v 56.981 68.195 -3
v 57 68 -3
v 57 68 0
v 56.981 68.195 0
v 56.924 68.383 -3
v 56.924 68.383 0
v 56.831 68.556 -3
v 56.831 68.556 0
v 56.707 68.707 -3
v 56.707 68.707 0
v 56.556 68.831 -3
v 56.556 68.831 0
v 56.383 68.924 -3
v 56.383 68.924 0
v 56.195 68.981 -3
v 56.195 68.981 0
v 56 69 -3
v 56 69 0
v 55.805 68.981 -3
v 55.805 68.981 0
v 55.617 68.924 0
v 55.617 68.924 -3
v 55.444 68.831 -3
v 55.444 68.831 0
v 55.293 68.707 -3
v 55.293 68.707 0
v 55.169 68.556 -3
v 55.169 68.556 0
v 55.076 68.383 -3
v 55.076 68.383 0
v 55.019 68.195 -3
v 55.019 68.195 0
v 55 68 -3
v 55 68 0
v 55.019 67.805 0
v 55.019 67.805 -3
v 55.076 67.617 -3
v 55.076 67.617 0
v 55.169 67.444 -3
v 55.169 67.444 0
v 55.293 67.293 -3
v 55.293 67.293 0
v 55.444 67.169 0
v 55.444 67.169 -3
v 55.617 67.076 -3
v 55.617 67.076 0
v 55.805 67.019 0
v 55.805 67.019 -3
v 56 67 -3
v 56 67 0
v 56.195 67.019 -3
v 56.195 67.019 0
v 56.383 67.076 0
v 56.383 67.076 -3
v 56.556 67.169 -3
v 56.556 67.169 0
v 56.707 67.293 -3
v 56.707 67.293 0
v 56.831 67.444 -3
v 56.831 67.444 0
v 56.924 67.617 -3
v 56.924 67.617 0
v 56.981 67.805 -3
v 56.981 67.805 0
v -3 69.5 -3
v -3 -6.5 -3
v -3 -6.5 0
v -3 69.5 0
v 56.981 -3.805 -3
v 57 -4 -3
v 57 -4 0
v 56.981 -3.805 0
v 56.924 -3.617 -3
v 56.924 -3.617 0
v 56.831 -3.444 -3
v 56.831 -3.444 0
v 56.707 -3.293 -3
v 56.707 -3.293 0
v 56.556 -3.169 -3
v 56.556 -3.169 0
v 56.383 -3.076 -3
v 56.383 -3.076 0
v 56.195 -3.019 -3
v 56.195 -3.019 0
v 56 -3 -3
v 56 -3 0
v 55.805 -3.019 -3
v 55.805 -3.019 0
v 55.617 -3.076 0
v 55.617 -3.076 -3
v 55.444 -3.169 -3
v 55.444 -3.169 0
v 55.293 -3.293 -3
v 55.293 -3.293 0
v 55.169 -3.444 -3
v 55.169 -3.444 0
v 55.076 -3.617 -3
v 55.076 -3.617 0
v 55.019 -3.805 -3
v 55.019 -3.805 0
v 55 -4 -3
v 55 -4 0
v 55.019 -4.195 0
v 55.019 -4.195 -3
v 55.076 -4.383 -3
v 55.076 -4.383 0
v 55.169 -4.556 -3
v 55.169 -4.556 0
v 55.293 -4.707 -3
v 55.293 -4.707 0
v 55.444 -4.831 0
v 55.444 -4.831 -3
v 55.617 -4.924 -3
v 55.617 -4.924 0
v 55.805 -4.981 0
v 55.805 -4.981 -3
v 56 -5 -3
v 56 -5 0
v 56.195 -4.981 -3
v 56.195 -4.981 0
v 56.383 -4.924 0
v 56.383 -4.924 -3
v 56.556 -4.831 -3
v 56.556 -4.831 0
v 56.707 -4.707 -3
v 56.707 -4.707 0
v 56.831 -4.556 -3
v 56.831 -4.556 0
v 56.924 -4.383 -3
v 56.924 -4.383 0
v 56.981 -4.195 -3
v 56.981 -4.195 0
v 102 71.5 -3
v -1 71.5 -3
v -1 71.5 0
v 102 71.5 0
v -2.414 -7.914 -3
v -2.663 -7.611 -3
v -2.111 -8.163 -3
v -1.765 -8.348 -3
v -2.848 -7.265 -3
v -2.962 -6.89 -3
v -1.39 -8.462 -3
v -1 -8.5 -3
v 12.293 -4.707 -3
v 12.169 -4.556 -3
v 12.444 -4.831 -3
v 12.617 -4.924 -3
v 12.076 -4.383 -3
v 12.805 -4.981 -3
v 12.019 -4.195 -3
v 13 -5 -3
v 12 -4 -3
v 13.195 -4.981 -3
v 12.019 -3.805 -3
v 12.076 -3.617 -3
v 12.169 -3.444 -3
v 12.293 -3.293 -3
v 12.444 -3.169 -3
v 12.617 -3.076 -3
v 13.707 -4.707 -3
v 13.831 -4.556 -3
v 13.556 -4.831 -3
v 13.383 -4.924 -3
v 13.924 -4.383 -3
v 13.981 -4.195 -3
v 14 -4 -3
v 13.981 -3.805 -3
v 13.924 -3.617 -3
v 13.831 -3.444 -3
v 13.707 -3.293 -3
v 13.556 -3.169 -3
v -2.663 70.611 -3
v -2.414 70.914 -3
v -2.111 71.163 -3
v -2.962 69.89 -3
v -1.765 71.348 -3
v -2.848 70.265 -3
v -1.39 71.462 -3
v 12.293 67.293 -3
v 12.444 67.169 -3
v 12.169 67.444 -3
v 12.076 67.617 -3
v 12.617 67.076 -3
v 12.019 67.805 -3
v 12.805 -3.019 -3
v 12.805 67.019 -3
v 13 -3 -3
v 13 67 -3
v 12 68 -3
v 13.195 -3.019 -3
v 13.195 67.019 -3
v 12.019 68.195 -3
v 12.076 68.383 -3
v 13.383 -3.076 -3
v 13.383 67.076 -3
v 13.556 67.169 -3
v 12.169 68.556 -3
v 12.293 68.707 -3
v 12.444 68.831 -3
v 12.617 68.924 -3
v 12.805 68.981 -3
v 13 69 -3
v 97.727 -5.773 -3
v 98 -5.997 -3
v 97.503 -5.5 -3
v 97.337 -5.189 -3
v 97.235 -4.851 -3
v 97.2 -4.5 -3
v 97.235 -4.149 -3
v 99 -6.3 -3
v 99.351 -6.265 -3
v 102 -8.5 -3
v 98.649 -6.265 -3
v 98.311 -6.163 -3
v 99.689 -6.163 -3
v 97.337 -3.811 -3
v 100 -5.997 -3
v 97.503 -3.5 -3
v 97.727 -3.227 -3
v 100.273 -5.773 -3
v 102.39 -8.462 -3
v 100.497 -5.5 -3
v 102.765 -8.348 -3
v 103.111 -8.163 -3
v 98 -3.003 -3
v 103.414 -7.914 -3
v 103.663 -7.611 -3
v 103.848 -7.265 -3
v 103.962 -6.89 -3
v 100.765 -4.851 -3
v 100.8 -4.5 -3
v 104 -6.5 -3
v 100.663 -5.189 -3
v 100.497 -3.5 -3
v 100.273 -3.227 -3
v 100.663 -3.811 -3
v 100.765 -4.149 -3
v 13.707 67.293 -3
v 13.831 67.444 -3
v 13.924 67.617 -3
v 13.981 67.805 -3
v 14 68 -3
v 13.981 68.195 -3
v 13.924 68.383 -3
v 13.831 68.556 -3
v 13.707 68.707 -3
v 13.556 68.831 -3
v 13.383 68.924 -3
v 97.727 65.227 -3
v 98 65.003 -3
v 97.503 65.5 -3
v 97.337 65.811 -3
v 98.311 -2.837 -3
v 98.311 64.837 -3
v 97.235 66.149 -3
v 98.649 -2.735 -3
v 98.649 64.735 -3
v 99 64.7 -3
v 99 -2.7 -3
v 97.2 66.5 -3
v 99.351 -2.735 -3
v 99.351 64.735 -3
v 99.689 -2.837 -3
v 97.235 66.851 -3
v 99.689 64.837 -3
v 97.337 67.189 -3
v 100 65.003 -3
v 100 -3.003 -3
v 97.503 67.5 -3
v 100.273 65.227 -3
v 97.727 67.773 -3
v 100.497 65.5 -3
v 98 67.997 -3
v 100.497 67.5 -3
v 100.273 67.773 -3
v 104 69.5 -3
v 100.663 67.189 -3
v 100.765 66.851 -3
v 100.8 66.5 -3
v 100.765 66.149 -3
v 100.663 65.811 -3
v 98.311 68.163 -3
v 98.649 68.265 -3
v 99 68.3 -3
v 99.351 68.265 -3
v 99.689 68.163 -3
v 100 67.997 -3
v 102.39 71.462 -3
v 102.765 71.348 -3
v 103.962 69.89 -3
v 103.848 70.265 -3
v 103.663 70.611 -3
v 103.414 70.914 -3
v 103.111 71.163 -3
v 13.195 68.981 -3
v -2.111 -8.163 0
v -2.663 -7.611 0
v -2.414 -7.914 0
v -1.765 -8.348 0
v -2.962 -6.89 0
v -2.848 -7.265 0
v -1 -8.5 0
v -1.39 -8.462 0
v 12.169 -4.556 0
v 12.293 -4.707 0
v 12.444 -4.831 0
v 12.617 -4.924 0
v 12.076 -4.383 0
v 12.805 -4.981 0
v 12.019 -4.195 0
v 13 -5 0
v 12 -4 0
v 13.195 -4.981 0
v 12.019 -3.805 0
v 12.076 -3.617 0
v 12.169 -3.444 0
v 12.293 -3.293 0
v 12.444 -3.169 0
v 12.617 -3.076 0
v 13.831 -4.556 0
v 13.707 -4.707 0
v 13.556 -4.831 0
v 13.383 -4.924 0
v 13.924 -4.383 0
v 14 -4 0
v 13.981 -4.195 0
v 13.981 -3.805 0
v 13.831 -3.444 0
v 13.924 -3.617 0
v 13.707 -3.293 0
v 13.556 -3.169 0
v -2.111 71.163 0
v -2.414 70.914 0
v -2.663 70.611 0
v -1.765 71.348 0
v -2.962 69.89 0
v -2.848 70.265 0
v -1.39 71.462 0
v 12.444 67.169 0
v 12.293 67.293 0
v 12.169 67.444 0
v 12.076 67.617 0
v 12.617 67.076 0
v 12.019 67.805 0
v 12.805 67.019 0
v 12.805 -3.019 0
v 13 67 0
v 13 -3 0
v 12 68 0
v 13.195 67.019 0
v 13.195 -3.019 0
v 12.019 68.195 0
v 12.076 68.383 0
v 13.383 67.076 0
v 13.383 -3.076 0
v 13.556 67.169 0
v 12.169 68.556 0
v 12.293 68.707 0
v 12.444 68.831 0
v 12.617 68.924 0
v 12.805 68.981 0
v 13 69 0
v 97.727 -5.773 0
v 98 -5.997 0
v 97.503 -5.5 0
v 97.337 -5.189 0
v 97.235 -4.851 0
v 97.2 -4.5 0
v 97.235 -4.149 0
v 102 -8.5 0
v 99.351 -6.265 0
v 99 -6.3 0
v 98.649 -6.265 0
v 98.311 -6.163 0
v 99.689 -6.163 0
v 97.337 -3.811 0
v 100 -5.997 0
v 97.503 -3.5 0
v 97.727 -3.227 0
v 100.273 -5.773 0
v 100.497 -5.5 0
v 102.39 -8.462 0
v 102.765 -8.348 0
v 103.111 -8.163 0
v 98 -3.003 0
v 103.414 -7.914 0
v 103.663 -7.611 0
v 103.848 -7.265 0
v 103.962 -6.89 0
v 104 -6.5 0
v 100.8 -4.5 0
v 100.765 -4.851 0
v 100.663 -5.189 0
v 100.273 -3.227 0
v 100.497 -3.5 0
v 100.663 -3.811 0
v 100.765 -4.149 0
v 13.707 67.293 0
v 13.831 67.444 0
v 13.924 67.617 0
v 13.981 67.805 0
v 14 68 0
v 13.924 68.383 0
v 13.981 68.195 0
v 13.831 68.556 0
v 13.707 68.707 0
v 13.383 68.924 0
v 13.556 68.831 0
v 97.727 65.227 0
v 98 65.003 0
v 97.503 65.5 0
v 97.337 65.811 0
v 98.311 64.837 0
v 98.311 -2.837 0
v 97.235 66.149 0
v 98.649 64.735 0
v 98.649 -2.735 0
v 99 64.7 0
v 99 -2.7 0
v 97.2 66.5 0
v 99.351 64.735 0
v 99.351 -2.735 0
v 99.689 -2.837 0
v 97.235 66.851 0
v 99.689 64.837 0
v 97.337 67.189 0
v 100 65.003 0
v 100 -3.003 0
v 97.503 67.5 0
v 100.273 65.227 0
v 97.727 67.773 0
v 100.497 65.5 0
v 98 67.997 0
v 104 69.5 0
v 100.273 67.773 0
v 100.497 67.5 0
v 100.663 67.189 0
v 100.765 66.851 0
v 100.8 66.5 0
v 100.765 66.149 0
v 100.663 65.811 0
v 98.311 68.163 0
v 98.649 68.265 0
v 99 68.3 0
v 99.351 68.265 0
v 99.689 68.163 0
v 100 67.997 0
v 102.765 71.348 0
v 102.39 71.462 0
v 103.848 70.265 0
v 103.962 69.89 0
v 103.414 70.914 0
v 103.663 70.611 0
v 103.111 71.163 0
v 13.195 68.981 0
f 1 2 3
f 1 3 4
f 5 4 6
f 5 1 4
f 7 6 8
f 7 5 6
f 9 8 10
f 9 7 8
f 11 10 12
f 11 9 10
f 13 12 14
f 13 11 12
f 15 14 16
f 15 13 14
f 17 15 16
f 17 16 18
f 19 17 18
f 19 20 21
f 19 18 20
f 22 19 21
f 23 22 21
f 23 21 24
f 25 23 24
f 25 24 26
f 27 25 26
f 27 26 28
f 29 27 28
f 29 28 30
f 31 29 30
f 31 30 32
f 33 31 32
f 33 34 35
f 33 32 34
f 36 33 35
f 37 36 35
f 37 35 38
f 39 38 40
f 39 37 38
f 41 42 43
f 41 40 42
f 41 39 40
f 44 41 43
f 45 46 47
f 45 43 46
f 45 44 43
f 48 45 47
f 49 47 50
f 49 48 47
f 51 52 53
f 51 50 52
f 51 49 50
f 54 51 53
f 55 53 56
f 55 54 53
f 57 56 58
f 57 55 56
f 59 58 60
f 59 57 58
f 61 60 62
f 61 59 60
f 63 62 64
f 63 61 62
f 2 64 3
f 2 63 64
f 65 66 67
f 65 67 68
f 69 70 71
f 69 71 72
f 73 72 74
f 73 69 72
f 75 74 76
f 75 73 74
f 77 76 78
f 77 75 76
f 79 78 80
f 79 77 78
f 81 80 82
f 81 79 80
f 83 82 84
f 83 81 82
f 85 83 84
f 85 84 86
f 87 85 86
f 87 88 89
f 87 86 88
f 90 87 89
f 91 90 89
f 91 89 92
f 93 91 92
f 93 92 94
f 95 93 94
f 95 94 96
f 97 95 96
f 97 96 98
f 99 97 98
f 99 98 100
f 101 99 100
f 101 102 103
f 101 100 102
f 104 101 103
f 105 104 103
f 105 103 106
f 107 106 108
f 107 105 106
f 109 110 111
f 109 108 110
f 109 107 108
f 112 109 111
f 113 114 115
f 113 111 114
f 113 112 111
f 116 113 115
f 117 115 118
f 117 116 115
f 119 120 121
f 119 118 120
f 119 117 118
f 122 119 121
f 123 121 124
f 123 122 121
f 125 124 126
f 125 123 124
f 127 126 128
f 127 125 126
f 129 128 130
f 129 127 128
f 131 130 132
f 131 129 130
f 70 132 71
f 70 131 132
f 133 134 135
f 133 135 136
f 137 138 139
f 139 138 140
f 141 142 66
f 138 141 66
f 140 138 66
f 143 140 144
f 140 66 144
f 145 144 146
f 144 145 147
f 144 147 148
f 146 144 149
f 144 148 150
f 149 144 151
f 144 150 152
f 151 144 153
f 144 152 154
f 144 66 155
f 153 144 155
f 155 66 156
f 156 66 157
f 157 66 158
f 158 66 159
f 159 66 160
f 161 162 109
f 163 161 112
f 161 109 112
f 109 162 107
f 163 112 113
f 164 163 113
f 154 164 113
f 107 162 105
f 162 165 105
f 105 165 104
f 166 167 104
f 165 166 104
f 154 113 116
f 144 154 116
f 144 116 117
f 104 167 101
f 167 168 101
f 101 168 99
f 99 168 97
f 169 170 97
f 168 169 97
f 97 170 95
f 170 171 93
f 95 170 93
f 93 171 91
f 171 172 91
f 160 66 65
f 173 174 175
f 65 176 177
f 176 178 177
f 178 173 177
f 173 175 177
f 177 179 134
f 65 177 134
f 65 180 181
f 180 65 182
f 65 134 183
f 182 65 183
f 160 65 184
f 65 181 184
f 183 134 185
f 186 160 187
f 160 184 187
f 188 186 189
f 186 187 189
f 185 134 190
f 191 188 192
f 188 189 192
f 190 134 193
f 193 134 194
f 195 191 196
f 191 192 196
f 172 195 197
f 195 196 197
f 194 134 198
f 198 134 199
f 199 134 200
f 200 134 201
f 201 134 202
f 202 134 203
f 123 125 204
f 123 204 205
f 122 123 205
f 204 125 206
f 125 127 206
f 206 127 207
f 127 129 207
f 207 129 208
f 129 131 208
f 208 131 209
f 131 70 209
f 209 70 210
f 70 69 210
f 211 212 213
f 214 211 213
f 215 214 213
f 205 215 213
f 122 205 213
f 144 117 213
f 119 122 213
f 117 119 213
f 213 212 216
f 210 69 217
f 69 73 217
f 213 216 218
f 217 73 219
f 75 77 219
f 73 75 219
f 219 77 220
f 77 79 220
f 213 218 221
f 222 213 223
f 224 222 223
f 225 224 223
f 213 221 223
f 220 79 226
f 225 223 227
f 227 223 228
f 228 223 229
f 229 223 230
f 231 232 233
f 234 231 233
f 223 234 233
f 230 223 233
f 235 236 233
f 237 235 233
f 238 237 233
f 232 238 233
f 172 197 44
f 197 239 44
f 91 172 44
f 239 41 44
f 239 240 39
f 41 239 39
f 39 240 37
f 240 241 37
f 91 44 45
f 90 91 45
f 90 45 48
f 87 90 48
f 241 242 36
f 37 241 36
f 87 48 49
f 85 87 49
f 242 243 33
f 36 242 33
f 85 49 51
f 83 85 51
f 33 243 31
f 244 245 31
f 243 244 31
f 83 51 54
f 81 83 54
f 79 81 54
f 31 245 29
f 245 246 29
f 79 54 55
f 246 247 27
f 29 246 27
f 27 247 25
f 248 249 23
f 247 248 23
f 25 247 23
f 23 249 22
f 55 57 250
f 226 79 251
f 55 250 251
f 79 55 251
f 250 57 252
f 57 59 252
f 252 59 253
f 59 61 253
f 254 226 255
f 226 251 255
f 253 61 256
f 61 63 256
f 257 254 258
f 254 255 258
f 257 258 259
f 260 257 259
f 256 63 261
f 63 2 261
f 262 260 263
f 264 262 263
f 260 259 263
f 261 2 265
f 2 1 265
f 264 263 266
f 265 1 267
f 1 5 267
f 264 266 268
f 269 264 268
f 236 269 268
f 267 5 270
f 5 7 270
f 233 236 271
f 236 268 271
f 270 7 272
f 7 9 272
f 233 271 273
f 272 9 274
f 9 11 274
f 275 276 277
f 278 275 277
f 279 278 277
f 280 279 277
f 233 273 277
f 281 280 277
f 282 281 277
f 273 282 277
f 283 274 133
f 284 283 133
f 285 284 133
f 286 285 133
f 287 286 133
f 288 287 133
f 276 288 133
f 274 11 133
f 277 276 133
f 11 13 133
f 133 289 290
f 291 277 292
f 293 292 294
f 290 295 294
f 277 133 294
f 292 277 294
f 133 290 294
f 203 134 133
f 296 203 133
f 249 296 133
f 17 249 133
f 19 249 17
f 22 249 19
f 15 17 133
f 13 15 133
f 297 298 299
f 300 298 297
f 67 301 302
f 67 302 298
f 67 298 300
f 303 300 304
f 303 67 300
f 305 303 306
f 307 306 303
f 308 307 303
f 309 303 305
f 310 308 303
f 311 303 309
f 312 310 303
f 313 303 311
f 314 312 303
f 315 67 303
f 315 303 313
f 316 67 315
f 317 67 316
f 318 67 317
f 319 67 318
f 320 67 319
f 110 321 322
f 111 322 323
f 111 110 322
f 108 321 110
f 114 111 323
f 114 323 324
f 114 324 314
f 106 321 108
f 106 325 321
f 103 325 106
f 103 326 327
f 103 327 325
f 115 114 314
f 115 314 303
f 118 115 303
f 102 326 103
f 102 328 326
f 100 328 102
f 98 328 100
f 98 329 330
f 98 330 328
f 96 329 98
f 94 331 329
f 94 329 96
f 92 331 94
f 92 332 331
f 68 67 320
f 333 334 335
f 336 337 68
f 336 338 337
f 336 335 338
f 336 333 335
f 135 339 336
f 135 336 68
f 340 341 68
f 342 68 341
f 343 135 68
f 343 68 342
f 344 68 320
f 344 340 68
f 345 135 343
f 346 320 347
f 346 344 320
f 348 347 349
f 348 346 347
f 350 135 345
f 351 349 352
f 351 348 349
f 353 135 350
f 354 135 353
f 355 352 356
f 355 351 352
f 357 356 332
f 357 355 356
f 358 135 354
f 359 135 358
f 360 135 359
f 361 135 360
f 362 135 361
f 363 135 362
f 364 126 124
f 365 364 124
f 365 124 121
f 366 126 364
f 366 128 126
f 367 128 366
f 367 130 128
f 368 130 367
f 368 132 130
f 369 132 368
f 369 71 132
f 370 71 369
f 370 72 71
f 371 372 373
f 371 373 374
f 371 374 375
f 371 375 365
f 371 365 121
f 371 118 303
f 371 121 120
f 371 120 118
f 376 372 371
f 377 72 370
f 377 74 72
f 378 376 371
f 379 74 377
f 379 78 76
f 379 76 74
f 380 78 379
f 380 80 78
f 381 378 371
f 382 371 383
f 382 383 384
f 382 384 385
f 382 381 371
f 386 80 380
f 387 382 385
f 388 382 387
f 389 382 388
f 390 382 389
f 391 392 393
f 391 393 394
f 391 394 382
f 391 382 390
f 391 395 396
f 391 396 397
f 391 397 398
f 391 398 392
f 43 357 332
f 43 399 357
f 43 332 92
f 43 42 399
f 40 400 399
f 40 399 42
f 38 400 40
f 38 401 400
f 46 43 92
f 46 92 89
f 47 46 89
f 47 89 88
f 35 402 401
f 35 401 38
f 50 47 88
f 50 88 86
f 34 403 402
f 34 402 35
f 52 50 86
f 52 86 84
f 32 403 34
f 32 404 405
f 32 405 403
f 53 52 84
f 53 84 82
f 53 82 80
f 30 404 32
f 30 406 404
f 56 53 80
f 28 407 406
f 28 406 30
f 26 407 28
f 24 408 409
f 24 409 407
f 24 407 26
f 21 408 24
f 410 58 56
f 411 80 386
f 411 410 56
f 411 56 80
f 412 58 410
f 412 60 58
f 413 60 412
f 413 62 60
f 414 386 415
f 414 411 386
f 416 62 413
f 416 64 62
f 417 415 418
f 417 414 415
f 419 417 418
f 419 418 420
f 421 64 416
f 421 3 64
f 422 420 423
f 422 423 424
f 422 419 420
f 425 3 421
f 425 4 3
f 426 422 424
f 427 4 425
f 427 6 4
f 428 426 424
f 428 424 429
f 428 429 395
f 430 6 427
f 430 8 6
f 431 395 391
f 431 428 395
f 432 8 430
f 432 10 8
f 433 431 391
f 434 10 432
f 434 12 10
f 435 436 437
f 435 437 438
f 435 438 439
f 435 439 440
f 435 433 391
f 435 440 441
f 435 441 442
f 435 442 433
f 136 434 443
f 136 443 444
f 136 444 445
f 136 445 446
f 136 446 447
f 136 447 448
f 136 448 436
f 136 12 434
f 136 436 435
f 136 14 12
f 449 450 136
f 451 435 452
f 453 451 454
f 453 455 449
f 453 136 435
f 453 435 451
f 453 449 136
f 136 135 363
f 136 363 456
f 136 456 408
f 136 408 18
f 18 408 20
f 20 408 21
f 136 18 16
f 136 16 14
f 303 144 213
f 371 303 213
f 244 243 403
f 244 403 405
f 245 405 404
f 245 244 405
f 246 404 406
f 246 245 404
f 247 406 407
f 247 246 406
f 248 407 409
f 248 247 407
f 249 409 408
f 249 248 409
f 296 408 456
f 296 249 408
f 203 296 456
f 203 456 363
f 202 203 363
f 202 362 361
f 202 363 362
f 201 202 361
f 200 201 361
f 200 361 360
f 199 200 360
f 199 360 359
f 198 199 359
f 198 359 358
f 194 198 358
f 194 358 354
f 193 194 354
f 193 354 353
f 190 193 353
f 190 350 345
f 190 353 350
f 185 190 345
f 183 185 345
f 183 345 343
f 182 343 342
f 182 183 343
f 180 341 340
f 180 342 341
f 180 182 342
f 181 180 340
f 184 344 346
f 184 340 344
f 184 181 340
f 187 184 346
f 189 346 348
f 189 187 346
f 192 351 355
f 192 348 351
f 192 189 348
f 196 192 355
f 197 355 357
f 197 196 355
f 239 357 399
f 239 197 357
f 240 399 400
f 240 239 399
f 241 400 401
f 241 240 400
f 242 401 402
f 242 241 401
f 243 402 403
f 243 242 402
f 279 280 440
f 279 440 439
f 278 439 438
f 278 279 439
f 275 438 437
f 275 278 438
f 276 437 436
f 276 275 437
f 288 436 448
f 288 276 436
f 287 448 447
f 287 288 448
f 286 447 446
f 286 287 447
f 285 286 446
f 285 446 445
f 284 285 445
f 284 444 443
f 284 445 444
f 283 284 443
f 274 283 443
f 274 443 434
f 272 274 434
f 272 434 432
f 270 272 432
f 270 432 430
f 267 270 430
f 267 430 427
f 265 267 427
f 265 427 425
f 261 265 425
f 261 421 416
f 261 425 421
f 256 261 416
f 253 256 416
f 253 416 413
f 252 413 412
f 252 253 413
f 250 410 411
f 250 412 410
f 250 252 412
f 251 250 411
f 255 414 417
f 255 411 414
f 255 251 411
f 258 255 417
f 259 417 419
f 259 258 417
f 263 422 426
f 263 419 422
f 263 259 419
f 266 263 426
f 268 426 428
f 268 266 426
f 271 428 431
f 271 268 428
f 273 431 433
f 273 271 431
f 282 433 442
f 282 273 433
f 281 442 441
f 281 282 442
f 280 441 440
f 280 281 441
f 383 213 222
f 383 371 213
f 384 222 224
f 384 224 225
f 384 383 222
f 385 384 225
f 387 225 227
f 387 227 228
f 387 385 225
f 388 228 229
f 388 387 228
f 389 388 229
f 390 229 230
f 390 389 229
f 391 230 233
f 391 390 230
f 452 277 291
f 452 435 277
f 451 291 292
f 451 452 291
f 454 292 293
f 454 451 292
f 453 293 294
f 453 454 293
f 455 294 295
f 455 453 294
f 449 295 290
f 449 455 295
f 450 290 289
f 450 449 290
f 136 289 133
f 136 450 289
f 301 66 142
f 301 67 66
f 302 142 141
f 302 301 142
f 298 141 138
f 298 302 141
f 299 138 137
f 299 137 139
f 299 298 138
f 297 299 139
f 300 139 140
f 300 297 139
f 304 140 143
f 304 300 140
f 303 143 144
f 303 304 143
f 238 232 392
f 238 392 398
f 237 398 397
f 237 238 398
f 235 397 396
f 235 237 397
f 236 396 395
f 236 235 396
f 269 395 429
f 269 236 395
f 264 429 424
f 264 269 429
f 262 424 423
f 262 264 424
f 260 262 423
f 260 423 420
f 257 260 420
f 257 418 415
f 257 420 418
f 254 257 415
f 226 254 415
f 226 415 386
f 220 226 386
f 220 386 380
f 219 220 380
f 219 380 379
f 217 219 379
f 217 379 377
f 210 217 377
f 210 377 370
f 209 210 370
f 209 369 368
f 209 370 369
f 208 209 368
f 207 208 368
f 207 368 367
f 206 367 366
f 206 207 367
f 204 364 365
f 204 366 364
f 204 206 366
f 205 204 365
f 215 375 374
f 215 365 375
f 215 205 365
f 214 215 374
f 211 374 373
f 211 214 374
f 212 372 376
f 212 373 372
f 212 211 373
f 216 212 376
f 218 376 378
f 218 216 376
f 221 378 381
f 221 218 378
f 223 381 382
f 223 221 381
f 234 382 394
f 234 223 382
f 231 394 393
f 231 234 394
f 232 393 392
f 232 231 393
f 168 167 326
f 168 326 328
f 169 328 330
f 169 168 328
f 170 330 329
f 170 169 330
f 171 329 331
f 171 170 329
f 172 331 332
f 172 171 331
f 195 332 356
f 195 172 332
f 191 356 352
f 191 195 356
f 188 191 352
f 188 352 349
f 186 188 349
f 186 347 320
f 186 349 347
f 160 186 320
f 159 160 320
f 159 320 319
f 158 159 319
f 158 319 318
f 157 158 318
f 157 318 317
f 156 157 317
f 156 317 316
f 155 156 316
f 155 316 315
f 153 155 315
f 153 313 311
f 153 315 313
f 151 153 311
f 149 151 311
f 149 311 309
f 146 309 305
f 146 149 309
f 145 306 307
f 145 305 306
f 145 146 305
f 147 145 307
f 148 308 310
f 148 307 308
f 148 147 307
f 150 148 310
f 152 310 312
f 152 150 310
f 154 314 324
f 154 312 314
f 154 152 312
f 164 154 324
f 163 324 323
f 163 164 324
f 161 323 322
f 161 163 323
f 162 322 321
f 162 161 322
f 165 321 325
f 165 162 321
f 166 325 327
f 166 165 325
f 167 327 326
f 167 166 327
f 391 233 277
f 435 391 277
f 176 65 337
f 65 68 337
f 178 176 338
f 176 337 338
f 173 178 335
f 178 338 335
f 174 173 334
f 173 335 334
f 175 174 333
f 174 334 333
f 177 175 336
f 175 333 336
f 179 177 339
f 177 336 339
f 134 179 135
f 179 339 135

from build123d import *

# Parameters (mm, degrees)
CYLINDER003_R     = 1.8
CYLINDER003_DEPTH = 40
ARRAY004_Y_COUNT  = 2
ARRAY004_Y_PITCH  = 71
CYLINDER002_R     = 1
CYLINDER002_DEPTH = 100
ARRAY003_X_COUNT  = 2
ARRAY003_X_PITCH  = 43
ARRAY003_Y_COUNT  = 2
ARRAY003_Y_PITCH  = 72
BOX004_W          = 107
BOX004_H          = 80
BOX004_DEPTH      = 3
FILLET001_R       = 2


with BuildPart() as body_corners:
    # Cylinder003 → Cylinder003 (new body)
    with BuildSketch(Plane(origin=(99, -4.5, -15), x_dir=(1, 0, 0), z_dir=(0, 0, 1))):
        Circle(CYLINDER003_R)
    extrude(amount=CYLINDER003_DEPTH)

    # Array004 Y: Body corners ×2


with BuildPart() as body_corners_1:
    add(body_corners.part)
    with Locations(*[(0, i * ARRAY004_Y_PITCH, 0) for i in range(1, ARRAY004_Y_COUNT)]):
        add(body_corners.part)


with BuildPart() as fusion002:
    # Cylinder002 → Cylinder002 (new body)
    with BuildSketch(Plane(origin=(13, -4, -15), x_dir=(1, 0, 0), z_dir=(0, 0, 1))):
        Circle(CYLINDER002_R)
    extrude(amount=CYLINDER002_DEPTH)

    # Array003 X: Fusion002 ×2


with BuildPart() as fusion002_1:
    add(fusion002.part)
    with Locations(*[(i * ARRAY003_X_PITCH, 0, 0) for i in range(1, ARRAY003_X_COUNT)]):
        add(fusion002.part)

    # Array003 Y: Fusion002 ×2


with BuildPart() as fusion002_2:
    add(fusion002_1.part)
    with Locations(*[(0, i * ARRAY003_Y_PITCH, 0) for i in range(1, ARRAY003_Y_COUNT)]):
        add(fusion002_1.part)

    # Fusion002: union Body corners
    add(body_corners_1.part)


with BuildPart() as body006:
    # Box004 → Box004 (new body)
    with BuildSketch(Plane(origin=(-3, -8.5, -3), x_dir=(1, 0, 0), z_dir=(0, 0, 1))):
        with Locations((53.5, 40)):
            Rectangle(BOX004_W, BOX004_H)
    extrude(amount=BOX004_DEPTH)

    # Fillet001
    fillet001_edges = [body006.edges().sort_by_distance(p)[0] for p in [
        (-3, -8.5, -1.5),
        (-3, 71.5, -1.5),
        (104, -8.5, -1.5),
        (104, 71.5, -1.5),
    ]]
    fillet(fillet001_edges, radius=FILLET001_R)

    # Cut002: cut Fusion002
    add(fusion002_2.part, mode=Mode.SUBTRACT)


solid = body006.part
